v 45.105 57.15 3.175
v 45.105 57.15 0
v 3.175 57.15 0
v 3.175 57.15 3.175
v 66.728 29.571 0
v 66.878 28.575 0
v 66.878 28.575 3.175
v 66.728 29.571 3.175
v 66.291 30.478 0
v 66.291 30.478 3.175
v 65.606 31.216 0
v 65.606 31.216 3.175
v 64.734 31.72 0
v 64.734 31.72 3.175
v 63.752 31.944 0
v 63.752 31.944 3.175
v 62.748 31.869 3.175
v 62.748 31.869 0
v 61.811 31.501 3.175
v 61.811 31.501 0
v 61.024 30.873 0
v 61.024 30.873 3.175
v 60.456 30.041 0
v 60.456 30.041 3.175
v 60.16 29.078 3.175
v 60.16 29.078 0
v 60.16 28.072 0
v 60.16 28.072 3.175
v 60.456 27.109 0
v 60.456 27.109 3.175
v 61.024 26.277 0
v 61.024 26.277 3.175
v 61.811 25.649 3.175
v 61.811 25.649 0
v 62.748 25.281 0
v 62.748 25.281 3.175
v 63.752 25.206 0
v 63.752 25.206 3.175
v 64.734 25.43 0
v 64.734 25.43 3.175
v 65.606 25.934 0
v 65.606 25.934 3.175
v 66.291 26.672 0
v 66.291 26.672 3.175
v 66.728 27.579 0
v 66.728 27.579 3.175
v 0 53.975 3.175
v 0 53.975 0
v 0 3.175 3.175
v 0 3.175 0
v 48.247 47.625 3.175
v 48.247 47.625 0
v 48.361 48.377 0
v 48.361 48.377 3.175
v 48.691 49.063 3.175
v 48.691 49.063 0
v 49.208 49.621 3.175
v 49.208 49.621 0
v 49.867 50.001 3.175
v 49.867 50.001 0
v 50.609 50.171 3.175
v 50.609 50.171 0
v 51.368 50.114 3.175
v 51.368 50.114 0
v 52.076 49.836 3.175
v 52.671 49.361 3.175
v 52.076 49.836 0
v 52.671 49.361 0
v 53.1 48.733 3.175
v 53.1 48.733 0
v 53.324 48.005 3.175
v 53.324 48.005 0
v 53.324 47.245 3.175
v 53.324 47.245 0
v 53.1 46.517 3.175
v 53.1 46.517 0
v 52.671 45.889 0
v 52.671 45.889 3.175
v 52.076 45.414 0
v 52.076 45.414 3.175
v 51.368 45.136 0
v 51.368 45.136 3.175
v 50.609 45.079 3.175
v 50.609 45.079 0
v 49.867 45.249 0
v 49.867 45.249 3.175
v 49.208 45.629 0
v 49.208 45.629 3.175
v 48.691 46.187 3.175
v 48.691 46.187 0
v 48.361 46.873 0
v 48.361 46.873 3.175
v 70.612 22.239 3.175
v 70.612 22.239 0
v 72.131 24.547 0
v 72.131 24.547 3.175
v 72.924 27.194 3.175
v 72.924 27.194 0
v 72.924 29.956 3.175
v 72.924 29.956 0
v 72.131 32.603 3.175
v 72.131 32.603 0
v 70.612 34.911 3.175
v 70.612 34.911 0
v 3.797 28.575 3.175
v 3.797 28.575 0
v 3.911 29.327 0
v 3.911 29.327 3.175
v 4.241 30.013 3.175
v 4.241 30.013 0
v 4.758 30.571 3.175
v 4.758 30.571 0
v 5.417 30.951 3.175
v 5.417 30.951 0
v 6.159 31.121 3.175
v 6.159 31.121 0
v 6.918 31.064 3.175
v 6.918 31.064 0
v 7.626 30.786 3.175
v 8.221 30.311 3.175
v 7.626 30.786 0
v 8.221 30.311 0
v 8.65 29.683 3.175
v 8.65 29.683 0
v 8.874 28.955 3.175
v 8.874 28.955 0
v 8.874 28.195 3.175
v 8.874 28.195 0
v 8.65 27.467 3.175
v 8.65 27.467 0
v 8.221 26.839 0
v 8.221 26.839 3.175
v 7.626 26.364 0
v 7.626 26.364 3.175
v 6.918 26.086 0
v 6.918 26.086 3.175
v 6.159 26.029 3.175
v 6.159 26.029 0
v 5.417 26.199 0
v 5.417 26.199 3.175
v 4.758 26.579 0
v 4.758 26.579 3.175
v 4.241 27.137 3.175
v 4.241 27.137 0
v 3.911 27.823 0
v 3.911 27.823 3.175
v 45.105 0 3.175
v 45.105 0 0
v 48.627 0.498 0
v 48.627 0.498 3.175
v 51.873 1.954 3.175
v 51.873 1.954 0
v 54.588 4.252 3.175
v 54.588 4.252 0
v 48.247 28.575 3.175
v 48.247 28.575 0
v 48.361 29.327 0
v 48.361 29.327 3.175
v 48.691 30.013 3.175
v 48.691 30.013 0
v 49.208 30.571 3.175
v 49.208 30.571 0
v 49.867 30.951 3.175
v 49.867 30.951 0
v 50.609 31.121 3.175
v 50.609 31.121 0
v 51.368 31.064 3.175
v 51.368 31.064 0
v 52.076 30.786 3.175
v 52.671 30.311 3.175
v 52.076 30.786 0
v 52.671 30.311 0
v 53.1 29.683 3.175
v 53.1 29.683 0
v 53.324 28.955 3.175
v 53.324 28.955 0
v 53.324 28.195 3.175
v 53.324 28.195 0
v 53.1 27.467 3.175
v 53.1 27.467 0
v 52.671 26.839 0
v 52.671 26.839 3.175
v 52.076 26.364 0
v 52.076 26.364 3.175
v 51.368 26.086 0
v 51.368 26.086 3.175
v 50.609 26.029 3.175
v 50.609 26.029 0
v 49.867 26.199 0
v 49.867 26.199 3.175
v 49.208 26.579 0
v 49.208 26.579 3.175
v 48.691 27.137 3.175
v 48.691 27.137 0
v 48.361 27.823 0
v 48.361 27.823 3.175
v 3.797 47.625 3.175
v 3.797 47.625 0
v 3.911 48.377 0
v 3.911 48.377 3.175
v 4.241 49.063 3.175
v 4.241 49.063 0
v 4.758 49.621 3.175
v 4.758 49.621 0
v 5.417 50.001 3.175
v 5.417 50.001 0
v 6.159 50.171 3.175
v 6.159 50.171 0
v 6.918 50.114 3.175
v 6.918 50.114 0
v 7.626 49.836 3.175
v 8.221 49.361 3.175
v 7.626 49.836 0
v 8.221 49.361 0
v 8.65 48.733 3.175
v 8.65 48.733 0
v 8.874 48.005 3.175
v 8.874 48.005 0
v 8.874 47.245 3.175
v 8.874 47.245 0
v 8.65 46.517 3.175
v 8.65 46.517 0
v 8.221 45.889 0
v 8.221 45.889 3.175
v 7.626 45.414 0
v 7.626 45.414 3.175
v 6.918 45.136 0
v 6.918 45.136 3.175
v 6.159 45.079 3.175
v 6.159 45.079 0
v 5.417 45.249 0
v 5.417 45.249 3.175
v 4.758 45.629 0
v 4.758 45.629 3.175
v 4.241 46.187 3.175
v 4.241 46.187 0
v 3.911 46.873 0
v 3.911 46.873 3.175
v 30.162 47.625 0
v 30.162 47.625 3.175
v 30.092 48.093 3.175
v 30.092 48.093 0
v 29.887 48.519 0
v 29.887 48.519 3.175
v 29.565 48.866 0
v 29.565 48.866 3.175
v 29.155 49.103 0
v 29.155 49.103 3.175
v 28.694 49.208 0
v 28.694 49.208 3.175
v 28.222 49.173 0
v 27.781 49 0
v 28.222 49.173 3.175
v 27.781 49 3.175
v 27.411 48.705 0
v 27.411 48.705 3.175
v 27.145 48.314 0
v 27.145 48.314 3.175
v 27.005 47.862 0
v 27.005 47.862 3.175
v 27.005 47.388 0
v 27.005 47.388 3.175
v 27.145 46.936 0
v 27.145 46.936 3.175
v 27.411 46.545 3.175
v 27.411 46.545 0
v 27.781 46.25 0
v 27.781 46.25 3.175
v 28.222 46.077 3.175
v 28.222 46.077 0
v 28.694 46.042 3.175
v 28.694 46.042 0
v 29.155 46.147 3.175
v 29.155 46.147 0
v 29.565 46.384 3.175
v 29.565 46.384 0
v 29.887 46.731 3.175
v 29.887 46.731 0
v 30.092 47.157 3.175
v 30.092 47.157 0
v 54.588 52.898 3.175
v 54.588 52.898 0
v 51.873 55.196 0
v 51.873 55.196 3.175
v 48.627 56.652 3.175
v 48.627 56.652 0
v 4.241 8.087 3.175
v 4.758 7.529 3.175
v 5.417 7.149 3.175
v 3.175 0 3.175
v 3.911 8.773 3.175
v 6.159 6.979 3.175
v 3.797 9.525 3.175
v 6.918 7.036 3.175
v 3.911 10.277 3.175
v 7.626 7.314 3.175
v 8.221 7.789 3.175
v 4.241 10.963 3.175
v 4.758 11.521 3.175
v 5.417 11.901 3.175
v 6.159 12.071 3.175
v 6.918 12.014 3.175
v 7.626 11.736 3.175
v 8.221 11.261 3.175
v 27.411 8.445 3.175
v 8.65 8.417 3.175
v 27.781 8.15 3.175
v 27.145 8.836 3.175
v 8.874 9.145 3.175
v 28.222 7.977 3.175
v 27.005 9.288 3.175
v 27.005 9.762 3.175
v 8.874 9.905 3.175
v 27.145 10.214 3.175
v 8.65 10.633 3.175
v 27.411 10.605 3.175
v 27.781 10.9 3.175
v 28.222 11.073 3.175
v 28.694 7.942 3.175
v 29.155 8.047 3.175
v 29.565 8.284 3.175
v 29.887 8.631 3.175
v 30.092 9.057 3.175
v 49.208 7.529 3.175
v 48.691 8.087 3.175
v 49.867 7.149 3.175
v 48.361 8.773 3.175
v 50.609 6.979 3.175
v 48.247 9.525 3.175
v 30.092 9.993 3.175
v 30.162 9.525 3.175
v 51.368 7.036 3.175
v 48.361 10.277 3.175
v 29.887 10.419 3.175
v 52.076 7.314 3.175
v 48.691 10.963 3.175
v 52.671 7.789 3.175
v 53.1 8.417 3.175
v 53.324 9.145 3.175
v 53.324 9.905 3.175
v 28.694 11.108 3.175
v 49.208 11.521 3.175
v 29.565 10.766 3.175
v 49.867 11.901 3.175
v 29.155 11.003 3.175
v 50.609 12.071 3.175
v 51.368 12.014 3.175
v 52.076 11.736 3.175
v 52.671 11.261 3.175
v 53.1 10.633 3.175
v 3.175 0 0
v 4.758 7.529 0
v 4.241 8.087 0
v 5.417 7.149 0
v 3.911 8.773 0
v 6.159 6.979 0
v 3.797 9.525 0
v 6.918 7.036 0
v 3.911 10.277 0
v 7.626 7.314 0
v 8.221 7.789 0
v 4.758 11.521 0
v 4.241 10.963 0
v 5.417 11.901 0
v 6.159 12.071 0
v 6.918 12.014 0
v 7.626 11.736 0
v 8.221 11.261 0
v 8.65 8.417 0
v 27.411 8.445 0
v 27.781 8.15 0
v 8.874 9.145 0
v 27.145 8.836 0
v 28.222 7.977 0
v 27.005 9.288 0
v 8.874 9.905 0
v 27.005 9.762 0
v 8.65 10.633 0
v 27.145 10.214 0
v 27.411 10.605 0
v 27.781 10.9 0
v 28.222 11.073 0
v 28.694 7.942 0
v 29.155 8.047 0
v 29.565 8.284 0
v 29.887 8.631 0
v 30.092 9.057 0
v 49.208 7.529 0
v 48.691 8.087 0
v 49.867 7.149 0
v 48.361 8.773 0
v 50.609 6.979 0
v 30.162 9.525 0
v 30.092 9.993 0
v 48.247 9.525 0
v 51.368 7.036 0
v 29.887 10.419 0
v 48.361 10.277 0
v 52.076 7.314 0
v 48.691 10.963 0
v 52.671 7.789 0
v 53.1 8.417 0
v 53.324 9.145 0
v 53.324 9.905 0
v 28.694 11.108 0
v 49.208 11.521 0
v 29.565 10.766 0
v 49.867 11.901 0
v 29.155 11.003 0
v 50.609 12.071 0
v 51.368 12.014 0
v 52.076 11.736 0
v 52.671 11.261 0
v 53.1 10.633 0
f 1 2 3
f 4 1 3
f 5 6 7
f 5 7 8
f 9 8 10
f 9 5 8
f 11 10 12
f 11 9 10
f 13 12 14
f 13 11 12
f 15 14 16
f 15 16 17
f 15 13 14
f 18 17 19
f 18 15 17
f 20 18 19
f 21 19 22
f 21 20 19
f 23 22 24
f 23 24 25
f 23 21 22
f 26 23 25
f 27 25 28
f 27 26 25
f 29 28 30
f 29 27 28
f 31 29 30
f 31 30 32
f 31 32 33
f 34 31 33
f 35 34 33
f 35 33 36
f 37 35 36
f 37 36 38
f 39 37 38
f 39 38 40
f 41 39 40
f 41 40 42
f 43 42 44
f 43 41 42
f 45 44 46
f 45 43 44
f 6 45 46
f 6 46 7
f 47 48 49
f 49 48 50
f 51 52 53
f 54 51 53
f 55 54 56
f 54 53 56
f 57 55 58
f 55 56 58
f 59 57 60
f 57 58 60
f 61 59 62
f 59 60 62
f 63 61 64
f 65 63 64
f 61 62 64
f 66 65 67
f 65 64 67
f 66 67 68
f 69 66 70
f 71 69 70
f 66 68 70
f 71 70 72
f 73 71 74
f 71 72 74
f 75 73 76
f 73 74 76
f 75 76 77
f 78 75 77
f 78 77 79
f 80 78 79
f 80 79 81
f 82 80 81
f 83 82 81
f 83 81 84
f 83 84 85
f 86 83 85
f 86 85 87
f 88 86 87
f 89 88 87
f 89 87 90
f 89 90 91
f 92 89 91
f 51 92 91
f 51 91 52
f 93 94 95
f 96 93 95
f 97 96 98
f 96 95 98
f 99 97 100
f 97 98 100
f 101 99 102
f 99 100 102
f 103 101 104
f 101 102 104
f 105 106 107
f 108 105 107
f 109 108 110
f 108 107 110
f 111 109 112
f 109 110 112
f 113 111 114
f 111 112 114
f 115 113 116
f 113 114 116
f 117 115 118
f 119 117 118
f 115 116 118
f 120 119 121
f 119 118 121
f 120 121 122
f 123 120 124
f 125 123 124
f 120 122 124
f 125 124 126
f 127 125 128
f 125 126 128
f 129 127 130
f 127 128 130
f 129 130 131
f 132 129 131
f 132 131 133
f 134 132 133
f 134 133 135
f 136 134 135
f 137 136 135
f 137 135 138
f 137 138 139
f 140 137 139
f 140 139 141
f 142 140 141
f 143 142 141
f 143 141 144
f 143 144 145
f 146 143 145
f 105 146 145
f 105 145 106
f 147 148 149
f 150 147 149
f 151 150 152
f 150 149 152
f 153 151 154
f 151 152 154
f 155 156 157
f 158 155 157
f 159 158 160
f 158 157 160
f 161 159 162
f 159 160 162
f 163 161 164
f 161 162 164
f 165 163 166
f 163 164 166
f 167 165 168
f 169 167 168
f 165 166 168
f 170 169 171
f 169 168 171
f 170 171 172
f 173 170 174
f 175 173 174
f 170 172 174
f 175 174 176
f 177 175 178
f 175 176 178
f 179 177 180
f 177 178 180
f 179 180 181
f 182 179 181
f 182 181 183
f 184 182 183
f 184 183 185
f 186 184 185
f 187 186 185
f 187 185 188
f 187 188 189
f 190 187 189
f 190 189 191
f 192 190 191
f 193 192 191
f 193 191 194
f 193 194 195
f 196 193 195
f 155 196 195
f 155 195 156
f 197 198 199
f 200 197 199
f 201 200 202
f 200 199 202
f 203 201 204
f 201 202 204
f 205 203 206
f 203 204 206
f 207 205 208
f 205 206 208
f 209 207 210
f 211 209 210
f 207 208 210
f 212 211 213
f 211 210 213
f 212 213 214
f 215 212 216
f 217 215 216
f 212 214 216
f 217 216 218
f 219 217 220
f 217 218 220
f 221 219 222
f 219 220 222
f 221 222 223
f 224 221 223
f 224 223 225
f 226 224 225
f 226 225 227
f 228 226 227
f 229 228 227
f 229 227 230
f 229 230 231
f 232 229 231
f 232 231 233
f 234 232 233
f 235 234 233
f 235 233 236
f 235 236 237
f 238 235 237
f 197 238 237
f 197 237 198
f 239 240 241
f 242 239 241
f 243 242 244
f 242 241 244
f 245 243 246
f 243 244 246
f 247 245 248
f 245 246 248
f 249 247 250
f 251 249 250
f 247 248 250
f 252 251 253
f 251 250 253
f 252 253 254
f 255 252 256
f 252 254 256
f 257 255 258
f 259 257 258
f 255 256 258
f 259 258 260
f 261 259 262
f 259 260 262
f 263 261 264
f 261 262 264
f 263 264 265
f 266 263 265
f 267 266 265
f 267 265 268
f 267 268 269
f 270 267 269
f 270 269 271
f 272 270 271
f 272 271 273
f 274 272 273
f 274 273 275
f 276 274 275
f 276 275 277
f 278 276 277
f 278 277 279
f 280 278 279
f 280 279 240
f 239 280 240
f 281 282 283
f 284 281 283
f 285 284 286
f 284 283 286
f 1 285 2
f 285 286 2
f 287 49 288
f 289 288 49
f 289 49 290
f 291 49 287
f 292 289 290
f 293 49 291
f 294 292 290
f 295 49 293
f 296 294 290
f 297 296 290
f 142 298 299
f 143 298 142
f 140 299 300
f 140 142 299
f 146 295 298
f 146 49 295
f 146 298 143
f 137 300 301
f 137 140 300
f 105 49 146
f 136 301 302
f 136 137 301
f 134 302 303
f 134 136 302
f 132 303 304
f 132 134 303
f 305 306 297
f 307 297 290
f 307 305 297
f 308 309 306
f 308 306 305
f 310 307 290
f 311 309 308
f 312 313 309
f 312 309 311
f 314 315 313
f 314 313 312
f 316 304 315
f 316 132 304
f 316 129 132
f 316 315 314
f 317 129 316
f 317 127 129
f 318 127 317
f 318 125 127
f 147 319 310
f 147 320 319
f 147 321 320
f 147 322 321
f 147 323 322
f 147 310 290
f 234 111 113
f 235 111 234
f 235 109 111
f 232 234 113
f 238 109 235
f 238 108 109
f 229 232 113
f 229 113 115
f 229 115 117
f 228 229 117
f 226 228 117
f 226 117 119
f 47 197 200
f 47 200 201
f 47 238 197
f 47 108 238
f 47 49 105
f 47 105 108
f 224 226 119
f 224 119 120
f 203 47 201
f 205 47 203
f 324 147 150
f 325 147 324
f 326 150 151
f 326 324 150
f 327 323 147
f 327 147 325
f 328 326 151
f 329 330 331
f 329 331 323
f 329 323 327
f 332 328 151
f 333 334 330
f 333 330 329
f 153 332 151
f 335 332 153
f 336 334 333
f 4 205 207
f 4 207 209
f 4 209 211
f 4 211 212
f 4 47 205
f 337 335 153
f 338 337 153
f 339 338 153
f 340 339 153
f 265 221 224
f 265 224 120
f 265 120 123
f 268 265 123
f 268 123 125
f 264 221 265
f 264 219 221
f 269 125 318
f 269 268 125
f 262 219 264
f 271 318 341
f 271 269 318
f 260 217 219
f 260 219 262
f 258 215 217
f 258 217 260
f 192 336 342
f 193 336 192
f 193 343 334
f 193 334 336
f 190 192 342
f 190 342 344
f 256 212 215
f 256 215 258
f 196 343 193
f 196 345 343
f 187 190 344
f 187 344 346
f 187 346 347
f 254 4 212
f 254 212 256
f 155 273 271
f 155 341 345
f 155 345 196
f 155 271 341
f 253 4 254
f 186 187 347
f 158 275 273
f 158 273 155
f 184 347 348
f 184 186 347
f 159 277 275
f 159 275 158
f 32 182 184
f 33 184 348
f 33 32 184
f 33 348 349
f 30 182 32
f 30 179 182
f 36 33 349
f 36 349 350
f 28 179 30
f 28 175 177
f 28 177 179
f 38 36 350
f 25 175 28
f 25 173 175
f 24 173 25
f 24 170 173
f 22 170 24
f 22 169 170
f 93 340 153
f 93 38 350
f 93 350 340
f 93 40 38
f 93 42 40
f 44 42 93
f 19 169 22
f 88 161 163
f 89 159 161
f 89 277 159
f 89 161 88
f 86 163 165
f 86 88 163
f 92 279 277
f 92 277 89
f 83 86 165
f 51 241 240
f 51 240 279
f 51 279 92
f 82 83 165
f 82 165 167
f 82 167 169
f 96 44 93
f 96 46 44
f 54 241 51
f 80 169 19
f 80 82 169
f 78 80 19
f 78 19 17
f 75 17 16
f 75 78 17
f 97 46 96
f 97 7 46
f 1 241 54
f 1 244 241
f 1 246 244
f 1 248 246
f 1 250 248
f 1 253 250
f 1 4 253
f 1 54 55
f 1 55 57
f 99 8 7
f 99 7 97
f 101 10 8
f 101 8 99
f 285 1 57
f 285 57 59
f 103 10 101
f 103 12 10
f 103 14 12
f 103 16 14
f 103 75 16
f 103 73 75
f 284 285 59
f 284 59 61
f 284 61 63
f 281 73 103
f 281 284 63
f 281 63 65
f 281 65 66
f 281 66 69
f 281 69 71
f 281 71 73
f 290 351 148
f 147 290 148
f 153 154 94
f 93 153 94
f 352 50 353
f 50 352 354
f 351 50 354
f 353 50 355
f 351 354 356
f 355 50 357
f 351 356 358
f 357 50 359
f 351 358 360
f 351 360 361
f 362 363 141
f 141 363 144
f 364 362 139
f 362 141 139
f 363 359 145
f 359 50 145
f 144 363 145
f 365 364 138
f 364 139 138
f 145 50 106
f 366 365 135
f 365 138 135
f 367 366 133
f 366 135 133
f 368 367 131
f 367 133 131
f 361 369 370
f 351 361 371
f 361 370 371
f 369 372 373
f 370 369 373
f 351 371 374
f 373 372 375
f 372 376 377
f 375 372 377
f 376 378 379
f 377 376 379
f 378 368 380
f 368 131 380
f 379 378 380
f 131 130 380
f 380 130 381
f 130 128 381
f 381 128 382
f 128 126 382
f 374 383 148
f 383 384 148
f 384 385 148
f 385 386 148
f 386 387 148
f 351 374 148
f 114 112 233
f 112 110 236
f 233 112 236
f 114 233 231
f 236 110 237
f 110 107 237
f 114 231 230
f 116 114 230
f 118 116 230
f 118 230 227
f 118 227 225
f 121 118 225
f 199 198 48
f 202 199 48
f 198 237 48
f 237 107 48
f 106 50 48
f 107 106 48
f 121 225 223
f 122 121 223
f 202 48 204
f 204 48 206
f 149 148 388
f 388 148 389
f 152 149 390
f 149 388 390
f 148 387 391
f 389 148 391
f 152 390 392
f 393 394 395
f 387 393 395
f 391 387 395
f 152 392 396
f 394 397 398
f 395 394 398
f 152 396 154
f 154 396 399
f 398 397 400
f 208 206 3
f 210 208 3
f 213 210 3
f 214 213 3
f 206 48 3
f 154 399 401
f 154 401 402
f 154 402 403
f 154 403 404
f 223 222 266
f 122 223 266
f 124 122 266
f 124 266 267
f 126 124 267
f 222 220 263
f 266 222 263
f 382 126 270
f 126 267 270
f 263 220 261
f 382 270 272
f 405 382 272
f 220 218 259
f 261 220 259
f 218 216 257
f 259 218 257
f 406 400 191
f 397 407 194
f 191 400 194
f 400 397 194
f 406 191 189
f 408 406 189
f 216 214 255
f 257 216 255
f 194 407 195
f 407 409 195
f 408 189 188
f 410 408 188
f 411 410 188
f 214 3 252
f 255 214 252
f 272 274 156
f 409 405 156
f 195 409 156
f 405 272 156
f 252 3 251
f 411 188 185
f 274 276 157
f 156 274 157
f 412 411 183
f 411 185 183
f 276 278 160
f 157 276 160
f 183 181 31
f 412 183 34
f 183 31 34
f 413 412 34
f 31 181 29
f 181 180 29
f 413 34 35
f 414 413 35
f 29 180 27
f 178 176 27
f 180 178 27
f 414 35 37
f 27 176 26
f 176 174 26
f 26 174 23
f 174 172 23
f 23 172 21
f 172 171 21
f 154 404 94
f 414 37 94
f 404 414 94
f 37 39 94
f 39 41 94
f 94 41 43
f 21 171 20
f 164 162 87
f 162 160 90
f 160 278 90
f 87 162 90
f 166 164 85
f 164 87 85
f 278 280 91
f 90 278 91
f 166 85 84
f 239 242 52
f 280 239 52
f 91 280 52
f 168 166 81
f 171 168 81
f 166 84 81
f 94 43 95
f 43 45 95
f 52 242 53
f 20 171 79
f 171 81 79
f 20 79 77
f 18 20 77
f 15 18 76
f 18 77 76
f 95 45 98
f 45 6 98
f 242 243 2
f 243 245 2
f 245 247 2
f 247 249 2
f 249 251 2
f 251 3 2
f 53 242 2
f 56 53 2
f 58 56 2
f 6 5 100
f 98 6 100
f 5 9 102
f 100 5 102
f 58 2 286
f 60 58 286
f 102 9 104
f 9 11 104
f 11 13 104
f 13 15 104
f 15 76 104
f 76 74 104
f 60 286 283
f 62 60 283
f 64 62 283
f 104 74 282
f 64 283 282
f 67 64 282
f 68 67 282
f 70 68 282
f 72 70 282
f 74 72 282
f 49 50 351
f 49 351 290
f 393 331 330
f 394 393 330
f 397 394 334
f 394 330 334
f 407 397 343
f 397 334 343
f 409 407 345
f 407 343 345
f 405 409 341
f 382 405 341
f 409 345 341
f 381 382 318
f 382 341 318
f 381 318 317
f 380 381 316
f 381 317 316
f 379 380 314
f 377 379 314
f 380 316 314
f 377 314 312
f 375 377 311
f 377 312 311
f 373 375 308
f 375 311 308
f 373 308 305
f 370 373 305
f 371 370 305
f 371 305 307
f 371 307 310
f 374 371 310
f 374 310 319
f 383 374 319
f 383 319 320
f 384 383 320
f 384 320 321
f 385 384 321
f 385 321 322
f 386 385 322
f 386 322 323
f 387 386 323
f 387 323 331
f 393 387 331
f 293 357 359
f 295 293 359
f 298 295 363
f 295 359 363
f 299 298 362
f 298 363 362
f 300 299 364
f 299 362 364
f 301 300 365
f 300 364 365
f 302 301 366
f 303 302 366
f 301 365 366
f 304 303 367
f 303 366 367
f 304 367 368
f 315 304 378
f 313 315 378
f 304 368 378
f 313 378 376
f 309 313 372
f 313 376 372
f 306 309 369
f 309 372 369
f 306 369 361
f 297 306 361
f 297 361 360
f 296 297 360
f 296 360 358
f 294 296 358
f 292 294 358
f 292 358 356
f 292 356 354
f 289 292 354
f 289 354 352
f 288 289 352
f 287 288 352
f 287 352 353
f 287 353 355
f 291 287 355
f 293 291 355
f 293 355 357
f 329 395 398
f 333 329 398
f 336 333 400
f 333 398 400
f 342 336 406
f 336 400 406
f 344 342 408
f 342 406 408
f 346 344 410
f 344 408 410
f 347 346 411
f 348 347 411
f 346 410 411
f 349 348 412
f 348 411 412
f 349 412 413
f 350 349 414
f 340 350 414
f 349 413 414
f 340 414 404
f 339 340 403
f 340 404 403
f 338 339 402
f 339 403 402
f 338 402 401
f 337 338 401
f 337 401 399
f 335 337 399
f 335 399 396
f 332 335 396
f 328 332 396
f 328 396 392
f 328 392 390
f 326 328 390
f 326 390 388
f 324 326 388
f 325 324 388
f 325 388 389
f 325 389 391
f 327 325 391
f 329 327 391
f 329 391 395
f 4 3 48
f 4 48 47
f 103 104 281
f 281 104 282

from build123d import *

# Parameters (mm, degrees)
SKETCH1_R              = 3.3782
BOSS_EXTRUDE1_DEPTH    = 3.175
F_10_CLEARANCE_HOLE1_D = 5.1054
CHAMFER1_SIZE          = 3.175
SKETCH4_R              = 1.5875
CUT_EXTRUDE1_DEPTH     = 4.175


with BuildPart() as part:
    # Sketch1 → Boss-Extrude1 (new body)
    with BuildSketch(Plane.XY):
        with BuildLine():
            Line((0, 0), (45.105286642, 0))
            ThreePointArc((45.105286642, 0), (50.301519782, 1.111679969), (54.588060278, 4.252100606))
            Line((54.588060278, 4.252100606), (70.612080227, 22.239075455))
            ThreePointArc((70.612080227, 22.239075455), (73.025, 28.575), (70.612080227, 34.910924545))
            Line((70.612080227, 34.910924545), (54.588060278, 52.897899394))
            ThreePointArc((54.588060278, 52.897899394), (50.301519782, 56.038320031), (45.105286642, 57.15))
            Line((45.105286642, 57.15), (0, 57.15))
            Line((0, 57.15), (0, 0))
        make_face()
        with Locations((63.5, 28.575)):
            Circle(SKETCH1_R, mode=Mode.SUBTRACT)
    extrude(amount=BOSS_EXTRUDE1_DEPTH)

    # #10 Clearance Hole1 (through all)
    with Locations(Plane.XY.offset(3.175)):
        with Locations((50.8, 28.575), (6.35, 28.575), (6.35, 47.625), (50.8, 47.625), (50.8, 9.525), (6.35, 9.525)):
            Hole(F_10_CLEARANCE_HOLE1_D / 2)

    # Chamfer1
    chamfer1_edges = [part.edges().sort_by_distance(p)[0] for p in [
        (0, 57.15, 1.5875),
        (0, 0, 1.5875),
    ]]
    chamfer(chamfer1_edges, length=CHAMFER1_SIZE)

    # Sketch4 → Cut-Extrude1 (cut, through all)
    with BuildSketch(Plane.XY.offset(3.175)):
        with Locations((28.575, 47.625)):
            Circle(SKETCH4_R)
        with Locations((28.575, 9.525)):
            Circle(SKETCH4_R)
    extrude(amount=-CUT_EXTRUDE1_DEPTH, mode=Mode.SUBTRACT)


solid = part.part
